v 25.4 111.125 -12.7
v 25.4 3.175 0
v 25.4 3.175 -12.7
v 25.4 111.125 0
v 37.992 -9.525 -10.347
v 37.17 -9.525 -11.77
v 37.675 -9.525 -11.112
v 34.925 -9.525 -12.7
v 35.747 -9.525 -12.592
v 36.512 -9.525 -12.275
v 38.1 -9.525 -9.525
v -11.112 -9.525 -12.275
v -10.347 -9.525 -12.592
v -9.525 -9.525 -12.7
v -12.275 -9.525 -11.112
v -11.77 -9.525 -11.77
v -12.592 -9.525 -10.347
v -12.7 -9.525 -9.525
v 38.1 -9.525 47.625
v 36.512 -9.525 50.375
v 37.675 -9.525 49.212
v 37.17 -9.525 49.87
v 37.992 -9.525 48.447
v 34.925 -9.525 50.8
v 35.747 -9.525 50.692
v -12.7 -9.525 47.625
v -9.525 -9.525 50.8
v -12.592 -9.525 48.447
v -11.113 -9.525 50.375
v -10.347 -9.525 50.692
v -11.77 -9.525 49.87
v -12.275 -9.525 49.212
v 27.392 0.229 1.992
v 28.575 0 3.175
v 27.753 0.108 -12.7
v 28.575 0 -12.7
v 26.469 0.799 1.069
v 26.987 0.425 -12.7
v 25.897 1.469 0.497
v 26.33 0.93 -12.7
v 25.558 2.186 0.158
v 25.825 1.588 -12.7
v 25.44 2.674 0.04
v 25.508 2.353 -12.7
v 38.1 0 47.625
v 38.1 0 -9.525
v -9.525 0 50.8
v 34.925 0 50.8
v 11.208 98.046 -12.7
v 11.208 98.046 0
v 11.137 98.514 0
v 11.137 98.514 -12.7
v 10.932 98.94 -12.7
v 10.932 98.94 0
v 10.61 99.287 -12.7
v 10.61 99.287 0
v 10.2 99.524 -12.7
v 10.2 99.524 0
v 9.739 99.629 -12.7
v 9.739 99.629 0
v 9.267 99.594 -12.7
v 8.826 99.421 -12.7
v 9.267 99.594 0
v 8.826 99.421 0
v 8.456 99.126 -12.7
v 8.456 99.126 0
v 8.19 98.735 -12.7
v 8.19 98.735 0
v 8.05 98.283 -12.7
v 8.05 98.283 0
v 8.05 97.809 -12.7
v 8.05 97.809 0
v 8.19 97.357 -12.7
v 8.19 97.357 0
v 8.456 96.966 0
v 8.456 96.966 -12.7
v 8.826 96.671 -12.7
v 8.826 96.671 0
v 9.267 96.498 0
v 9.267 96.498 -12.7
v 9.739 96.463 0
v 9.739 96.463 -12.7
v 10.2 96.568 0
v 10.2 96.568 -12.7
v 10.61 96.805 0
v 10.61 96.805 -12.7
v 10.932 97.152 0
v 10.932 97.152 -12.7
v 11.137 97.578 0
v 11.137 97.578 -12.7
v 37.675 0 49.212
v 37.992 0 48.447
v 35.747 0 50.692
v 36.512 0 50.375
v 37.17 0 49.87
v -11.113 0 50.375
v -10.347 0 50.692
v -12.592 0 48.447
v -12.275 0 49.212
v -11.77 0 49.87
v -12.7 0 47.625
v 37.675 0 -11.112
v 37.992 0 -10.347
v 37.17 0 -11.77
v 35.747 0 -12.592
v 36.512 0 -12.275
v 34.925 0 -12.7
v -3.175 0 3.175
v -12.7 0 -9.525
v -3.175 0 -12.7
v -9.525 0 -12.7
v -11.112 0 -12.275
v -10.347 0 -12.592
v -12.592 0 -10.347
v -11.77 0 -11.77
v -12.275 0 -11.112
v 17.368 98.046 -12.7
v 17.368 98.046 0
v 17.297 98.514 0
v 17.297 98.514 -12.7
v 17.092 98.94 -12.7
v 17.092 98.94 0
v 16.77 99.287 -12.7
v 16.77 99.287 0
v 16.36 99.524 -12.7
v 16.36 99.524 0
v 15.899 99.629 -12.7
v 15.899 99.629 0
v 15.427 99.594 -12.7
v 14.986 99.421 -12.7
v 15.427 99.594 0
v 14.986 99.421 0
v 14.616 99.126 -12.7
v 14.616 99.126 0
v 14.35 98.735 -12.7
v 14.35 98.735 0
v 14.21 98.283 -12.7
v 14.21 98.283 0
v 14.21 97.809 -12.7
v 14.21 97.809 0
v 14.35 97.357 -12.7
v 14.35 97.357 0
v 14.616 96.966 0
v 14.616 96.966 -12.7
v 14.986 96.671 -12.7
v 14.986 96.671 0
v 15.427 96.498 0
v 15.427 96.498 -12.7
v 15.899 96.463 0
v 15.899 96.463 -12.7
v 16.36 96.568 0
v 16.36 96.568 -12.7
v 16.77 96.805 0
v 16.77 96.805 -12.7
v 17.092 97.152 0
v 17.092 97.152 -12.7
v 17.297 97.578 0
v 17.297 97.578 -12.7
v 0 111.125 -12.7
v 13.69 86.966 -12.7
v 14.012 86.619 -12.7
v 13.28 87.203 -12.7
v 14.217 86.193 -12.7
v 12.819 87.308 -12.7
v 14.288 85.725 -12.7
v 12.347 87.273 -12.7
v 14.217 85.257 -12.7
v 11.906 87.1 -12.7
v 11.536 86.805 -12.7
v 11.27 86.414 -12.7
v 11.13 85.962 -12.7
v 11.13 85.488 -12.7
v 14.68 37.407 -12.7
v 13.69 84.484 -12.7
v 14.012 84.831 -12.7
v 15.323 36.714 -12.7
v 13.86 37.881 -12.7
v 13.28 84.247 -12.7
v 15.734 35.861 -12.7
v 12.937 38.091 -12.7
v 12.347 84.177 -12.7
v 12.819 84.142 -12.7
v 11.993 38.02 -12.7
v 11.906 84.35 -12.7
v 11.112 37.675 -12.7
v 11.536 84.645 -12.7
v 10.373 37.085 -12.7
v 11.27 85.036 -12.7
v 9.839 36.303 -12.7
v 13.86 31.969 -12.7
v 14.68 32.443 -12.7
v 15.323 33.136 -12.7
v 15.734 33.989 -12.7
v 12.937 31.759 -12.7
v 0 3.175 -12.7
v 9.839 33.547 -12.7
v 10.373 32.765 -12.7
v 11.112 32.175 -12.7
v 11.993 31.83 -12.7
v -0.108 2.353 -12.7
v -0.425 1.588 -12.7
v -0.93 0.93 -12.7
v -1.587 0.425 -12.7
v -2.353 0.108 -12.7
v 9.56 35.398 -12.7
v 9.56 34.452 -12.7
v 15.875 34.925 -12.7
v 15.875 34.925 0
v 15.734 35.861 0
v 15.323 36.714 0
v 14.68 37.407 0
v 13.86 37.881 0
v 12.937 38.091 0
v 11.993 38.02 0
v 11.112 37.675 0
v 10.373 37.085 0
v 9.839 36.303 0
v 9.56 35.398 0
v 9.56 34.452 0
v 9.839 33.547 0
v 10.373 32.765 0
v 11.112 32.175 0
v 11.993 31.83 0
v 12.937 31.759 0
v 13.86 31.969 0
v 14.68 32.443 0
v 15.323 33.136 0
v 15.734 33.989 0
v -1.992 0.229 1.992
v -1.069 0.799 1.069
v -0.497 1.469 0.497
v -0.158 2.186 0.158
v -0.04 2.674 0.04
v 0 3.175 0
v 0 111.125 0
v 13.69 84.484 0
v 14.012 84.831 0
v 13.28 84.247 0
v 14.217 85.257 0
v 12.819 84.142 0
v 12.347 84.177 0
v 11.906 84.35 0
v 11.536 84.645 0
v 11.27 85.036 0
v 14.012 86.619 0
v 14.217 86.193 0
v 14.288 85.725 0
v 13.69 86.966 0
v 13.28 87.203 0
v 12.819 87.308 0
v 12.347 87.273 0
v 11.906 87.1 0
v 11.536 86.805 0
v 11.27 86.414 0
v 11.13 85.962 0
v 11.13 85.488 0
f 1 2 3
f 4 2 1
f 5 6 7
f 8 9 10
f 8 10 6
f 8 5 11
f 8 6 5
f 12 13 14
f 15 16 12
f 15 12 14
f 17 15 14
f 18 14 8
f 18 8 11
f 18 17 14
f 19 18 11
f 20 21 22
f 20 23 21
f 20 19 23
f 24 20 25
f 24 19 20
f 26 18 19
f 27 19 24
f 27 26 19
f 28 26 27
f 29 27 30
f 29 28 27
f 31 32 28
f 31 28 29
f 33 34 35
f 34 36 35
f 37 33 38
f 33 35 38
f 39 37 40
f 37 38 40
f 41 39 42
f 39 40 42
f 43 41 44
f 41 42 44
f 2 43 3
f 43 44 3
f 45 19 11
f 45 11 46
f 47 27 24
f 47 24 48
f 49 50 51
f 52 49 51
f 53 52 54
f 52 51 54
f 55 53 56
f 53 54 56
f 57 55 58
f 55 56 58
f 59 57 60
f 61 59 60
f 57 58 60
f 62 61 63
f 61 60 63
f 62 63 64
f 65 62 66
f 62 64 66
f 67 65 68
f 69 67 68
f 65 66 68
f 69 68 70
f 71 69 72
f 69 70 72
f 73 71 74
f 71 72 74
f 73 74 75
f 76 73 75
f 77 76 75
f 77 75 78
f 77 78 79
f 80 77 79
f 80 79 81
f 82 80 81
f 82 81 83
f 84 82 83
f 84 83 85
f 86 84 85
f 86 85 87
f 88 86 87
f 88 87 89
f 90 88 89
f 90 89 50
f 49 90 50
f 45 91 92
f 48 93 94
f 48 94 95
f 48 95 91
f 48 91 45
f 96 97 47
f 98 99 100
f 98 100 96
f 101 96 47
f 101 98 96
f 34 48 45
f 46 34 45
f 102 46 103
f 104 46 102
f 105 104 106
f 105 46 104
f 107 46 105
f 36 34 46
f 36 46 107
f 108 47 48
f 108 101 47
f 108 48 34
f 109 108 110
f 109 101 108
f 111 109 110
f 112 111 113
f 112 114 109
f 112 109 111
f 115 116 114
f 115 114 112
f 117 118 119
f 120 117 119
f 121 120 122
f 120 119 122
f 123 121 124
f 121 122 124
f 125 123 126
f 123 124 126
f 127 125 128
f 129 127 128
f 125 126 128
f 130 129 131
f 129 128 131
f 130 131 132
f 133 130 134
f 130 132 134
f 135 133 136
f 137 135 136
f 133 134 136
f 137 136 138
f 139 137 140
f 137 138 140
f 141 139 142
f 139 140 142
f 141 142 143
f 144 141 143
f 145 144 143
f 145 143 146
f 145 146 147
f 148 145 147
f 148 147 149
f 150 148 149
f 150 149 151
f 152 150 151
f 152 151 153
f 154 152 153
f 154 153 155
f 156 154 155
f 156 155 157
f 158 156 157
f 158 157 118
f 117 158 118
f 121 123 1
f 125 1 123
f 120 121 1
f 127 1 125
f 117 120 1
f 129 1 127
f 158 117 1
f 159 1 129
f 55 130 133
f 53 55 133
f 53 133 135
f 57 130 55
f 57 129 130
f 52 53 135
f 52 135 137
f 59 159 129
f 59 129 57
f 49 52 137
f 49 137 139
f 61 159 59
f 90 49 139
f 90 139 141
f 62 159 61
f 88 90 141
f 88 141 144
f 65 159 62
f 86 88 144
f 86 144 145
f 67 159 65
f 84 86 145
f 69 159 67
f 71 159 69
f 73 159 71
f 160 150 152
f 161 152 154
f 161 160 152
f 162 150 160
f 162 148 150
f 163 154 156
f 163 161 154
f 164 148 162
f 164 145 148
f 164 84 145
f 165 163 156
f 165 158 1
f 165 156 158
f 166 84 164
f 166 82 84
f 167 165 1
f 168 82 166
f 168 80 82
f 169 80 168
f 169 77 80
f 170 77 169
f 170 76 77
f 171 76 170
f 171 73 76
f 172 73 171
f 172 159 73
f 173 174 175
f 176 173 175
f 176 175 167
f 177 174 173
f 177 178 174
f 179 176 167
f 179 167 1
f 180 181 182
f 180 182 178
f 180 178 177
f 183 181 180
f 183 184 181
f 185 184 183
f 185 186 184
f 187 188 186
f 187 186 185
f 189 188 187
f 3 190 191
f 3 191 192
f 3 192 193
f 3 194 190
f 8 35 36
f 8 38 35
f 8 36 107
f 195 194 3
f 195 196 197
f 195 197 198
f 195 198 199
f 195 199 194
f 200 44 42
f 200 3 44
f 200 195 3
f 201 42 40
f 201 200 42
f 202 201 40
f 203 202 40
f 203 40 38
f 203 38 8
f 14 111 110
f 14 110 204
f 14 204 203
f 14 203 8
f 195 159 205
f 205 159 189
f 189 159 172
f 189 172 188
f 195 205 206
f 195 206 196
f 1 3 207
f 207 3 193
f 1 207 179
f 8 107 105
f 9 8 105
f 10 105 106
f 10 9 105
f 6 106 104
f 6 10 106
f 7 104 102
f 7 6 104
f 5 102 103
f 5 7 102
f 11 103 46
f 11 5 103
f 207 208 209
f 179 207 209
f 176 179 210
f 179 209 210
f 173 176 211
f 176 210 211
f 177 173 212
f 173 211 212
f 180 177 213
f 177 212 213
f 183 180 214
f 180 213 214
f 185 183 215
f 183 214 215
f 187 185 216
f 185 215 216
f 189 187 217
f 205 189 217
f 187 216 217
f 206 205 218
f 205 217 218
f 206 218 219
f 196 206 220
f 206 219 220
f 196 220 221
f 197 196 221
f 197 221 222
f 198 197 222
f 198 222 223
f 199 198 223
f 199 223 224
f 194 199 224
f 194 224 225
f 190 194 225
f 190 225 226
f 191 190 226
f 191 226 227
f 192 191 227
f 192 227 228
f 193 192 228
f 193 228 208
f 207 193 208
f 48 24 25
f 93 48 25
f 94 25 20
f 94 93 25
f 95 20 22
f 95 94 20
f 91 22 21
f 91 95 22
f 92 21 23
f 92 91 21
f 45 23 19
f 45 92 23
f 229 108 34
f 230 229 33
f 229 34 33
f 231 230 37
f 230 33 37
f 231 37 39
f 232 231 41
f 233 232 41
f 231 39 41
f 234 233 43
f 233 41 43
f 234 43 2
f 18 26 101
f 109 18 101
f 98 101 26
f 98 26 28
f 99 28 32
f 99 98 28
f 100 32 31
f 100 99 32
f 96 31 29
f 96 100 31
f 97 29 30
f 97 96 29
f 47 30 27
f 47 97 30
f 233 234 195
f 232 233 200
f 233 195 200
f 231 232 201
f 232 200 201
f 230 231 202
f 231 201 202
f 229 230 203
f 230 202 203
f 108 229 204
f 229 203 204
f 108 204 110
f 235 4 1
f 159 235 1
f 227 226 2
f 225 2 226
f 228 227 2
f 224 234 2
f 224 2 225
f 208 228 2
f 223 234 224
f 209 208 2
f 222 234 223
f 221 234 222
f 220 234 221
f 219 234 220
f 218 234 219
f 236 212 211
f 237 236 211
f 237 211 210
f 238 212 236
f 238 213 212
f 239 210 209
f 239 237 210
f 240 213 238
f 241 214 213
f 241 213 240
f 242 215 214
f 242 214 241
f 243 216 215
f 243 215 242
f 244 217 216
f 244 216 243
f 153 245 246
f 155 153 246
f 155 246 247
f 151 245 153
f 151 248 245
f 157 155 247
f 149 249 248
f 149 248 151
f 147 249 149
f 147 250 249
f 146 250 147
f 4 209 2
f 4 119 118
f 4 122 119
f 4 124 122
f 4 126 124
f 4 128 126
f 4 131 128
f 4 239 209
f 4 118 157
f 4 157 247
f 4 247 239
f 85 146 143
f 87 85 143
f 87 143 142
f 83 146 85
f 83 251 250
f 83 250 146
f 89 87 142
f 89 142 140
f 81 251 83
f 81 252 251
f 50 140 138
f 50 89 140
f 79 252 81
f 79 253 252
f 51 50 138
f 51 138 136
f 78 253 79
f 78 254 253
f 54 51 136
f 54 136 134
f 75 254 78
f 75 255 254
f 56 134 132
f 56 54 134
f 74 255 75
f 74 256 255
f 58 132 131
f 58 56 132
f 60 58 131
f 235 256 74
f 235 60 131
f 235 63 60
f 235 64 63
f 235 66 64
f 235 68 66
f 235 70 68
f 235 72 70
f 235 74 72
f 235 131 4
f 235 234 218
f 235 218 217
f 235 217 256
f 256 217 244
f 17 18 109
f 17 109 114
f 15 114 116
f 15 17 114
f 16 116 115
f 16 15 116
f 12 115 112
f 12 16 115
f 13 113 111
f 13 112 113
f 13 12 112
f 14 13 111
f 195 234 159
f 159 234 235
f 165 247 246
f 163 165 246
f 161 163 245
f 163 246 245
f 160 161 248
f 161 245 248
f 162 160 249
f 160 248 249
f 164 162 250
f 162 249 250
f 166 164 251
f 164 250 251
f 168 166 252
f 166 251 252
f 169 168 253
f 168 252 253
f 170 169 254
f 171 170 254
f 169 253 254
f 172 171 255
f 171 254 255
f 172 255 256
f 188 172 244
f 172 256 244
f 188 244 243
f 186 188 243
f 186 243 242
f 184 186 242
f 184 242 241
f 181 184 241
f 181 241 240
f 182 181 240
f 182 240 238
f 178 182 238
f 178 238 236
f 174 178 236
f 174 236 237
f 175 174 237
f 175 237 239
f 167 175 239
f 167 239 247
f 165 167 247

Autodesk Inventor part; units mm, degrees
ref_plane "YZ Plane" through (0, 0, 0) normal (1, 0, 0) x (0, 1, 0)
ref_plane "XZ Plane" through (0, 0, 0) normal (0, 1, 0) x (-1, 0, 0)
ref_plane "XY Plane" through (0, 0, 0) normal (0, 0, 1) x (1, 0, 0)
sketch "Sketch1" plane through (0, 0, 0) normal (1, 0, 0) x (0, 1, 0)
  line L0 (0, 0) -> (111.125, 0)
  line L1 (111.125, 0) -> (111.125, -12.7)
  line L2 (111.125, -12.7) -> (-9.525, -12.7)
  line L3 (-9.525, -12.7) -> (-9.525, 50.8)
  line L4 (-9.525, 50.8) -> (0, 50.8)
  line L5 (0, 50.8) -> (0, 0)
  line L6 (0, 0) -> (0, -12.7)
  dimension "d0" = 111.125
  dimension "d1" = 12.7
  dimension "d2" = 120.65
  dimension "d3" = 63.5
extrude "Extrusion1" add sketch "Sketch1" along normal blind 25.4 contours L0 L1 L2 L6
sketch "Sketch2" plane through (0, 0, 0) normal (0, 0, 1) x (1, 0, 0)
  line L0 (0, 0) -> (25.4, 0) projected
  circle A0 centre (12.7, 34.925) radius 3.175
  circle A1 centre (12.7, 85.725) radius 1.5875
  circle A2 centre (15.78, 98.0459) radius 1.5875
  line L1 (25.4, 111.125) -> (25.4, 0) projected
  line L2 (0, 111.125) -> (0, 0) projected
  circle A3 centre (9.62, 98.0459) radius 1.5875
  line L3 (0, 111.125) -> (25.4, 111.125) projected
  line L4 (12.7, 111.125) -> (12.7, 0)
  dimension "d7" = 6.35
  dimension "d8" = 3.175
  dimension "d9" = 34.925
  dimension "d10" = 50.8
  dimension "d11" = 3.175
  dimension "d12" = 12.7
  dimension "d17" = 3.175
  dimension "d18" = 12.7
  dimension "d22" = 3.08
  dimension "d23" = 3.08
extrude "Extrusion2" cut sketch "Sketch2" against normal blind 25.4 contours L4 A0 | A0 L4 | L4 A1 | A1 L4 | A2 | A3
extrude "Extrusion3" add sketch "Sketch1" along normal blind 38.1 and the other way blind 12.7 contours L6 L2 L3 L4 L5
fillet "Fillet1" radius 3.175 3 edges at (25.4, 0, -6.35) (12.7, 0, 0) (0, 0, -6.35)
fillet "Fillet2" radius 3.175 4 edges at (38.1, -4.7625, -12.7) (38.1, -4.7625, 50.8) (-12.7, -4.7625, 50.8) (-12.7, -4.7625, -12.7)
properties part number "Based"
